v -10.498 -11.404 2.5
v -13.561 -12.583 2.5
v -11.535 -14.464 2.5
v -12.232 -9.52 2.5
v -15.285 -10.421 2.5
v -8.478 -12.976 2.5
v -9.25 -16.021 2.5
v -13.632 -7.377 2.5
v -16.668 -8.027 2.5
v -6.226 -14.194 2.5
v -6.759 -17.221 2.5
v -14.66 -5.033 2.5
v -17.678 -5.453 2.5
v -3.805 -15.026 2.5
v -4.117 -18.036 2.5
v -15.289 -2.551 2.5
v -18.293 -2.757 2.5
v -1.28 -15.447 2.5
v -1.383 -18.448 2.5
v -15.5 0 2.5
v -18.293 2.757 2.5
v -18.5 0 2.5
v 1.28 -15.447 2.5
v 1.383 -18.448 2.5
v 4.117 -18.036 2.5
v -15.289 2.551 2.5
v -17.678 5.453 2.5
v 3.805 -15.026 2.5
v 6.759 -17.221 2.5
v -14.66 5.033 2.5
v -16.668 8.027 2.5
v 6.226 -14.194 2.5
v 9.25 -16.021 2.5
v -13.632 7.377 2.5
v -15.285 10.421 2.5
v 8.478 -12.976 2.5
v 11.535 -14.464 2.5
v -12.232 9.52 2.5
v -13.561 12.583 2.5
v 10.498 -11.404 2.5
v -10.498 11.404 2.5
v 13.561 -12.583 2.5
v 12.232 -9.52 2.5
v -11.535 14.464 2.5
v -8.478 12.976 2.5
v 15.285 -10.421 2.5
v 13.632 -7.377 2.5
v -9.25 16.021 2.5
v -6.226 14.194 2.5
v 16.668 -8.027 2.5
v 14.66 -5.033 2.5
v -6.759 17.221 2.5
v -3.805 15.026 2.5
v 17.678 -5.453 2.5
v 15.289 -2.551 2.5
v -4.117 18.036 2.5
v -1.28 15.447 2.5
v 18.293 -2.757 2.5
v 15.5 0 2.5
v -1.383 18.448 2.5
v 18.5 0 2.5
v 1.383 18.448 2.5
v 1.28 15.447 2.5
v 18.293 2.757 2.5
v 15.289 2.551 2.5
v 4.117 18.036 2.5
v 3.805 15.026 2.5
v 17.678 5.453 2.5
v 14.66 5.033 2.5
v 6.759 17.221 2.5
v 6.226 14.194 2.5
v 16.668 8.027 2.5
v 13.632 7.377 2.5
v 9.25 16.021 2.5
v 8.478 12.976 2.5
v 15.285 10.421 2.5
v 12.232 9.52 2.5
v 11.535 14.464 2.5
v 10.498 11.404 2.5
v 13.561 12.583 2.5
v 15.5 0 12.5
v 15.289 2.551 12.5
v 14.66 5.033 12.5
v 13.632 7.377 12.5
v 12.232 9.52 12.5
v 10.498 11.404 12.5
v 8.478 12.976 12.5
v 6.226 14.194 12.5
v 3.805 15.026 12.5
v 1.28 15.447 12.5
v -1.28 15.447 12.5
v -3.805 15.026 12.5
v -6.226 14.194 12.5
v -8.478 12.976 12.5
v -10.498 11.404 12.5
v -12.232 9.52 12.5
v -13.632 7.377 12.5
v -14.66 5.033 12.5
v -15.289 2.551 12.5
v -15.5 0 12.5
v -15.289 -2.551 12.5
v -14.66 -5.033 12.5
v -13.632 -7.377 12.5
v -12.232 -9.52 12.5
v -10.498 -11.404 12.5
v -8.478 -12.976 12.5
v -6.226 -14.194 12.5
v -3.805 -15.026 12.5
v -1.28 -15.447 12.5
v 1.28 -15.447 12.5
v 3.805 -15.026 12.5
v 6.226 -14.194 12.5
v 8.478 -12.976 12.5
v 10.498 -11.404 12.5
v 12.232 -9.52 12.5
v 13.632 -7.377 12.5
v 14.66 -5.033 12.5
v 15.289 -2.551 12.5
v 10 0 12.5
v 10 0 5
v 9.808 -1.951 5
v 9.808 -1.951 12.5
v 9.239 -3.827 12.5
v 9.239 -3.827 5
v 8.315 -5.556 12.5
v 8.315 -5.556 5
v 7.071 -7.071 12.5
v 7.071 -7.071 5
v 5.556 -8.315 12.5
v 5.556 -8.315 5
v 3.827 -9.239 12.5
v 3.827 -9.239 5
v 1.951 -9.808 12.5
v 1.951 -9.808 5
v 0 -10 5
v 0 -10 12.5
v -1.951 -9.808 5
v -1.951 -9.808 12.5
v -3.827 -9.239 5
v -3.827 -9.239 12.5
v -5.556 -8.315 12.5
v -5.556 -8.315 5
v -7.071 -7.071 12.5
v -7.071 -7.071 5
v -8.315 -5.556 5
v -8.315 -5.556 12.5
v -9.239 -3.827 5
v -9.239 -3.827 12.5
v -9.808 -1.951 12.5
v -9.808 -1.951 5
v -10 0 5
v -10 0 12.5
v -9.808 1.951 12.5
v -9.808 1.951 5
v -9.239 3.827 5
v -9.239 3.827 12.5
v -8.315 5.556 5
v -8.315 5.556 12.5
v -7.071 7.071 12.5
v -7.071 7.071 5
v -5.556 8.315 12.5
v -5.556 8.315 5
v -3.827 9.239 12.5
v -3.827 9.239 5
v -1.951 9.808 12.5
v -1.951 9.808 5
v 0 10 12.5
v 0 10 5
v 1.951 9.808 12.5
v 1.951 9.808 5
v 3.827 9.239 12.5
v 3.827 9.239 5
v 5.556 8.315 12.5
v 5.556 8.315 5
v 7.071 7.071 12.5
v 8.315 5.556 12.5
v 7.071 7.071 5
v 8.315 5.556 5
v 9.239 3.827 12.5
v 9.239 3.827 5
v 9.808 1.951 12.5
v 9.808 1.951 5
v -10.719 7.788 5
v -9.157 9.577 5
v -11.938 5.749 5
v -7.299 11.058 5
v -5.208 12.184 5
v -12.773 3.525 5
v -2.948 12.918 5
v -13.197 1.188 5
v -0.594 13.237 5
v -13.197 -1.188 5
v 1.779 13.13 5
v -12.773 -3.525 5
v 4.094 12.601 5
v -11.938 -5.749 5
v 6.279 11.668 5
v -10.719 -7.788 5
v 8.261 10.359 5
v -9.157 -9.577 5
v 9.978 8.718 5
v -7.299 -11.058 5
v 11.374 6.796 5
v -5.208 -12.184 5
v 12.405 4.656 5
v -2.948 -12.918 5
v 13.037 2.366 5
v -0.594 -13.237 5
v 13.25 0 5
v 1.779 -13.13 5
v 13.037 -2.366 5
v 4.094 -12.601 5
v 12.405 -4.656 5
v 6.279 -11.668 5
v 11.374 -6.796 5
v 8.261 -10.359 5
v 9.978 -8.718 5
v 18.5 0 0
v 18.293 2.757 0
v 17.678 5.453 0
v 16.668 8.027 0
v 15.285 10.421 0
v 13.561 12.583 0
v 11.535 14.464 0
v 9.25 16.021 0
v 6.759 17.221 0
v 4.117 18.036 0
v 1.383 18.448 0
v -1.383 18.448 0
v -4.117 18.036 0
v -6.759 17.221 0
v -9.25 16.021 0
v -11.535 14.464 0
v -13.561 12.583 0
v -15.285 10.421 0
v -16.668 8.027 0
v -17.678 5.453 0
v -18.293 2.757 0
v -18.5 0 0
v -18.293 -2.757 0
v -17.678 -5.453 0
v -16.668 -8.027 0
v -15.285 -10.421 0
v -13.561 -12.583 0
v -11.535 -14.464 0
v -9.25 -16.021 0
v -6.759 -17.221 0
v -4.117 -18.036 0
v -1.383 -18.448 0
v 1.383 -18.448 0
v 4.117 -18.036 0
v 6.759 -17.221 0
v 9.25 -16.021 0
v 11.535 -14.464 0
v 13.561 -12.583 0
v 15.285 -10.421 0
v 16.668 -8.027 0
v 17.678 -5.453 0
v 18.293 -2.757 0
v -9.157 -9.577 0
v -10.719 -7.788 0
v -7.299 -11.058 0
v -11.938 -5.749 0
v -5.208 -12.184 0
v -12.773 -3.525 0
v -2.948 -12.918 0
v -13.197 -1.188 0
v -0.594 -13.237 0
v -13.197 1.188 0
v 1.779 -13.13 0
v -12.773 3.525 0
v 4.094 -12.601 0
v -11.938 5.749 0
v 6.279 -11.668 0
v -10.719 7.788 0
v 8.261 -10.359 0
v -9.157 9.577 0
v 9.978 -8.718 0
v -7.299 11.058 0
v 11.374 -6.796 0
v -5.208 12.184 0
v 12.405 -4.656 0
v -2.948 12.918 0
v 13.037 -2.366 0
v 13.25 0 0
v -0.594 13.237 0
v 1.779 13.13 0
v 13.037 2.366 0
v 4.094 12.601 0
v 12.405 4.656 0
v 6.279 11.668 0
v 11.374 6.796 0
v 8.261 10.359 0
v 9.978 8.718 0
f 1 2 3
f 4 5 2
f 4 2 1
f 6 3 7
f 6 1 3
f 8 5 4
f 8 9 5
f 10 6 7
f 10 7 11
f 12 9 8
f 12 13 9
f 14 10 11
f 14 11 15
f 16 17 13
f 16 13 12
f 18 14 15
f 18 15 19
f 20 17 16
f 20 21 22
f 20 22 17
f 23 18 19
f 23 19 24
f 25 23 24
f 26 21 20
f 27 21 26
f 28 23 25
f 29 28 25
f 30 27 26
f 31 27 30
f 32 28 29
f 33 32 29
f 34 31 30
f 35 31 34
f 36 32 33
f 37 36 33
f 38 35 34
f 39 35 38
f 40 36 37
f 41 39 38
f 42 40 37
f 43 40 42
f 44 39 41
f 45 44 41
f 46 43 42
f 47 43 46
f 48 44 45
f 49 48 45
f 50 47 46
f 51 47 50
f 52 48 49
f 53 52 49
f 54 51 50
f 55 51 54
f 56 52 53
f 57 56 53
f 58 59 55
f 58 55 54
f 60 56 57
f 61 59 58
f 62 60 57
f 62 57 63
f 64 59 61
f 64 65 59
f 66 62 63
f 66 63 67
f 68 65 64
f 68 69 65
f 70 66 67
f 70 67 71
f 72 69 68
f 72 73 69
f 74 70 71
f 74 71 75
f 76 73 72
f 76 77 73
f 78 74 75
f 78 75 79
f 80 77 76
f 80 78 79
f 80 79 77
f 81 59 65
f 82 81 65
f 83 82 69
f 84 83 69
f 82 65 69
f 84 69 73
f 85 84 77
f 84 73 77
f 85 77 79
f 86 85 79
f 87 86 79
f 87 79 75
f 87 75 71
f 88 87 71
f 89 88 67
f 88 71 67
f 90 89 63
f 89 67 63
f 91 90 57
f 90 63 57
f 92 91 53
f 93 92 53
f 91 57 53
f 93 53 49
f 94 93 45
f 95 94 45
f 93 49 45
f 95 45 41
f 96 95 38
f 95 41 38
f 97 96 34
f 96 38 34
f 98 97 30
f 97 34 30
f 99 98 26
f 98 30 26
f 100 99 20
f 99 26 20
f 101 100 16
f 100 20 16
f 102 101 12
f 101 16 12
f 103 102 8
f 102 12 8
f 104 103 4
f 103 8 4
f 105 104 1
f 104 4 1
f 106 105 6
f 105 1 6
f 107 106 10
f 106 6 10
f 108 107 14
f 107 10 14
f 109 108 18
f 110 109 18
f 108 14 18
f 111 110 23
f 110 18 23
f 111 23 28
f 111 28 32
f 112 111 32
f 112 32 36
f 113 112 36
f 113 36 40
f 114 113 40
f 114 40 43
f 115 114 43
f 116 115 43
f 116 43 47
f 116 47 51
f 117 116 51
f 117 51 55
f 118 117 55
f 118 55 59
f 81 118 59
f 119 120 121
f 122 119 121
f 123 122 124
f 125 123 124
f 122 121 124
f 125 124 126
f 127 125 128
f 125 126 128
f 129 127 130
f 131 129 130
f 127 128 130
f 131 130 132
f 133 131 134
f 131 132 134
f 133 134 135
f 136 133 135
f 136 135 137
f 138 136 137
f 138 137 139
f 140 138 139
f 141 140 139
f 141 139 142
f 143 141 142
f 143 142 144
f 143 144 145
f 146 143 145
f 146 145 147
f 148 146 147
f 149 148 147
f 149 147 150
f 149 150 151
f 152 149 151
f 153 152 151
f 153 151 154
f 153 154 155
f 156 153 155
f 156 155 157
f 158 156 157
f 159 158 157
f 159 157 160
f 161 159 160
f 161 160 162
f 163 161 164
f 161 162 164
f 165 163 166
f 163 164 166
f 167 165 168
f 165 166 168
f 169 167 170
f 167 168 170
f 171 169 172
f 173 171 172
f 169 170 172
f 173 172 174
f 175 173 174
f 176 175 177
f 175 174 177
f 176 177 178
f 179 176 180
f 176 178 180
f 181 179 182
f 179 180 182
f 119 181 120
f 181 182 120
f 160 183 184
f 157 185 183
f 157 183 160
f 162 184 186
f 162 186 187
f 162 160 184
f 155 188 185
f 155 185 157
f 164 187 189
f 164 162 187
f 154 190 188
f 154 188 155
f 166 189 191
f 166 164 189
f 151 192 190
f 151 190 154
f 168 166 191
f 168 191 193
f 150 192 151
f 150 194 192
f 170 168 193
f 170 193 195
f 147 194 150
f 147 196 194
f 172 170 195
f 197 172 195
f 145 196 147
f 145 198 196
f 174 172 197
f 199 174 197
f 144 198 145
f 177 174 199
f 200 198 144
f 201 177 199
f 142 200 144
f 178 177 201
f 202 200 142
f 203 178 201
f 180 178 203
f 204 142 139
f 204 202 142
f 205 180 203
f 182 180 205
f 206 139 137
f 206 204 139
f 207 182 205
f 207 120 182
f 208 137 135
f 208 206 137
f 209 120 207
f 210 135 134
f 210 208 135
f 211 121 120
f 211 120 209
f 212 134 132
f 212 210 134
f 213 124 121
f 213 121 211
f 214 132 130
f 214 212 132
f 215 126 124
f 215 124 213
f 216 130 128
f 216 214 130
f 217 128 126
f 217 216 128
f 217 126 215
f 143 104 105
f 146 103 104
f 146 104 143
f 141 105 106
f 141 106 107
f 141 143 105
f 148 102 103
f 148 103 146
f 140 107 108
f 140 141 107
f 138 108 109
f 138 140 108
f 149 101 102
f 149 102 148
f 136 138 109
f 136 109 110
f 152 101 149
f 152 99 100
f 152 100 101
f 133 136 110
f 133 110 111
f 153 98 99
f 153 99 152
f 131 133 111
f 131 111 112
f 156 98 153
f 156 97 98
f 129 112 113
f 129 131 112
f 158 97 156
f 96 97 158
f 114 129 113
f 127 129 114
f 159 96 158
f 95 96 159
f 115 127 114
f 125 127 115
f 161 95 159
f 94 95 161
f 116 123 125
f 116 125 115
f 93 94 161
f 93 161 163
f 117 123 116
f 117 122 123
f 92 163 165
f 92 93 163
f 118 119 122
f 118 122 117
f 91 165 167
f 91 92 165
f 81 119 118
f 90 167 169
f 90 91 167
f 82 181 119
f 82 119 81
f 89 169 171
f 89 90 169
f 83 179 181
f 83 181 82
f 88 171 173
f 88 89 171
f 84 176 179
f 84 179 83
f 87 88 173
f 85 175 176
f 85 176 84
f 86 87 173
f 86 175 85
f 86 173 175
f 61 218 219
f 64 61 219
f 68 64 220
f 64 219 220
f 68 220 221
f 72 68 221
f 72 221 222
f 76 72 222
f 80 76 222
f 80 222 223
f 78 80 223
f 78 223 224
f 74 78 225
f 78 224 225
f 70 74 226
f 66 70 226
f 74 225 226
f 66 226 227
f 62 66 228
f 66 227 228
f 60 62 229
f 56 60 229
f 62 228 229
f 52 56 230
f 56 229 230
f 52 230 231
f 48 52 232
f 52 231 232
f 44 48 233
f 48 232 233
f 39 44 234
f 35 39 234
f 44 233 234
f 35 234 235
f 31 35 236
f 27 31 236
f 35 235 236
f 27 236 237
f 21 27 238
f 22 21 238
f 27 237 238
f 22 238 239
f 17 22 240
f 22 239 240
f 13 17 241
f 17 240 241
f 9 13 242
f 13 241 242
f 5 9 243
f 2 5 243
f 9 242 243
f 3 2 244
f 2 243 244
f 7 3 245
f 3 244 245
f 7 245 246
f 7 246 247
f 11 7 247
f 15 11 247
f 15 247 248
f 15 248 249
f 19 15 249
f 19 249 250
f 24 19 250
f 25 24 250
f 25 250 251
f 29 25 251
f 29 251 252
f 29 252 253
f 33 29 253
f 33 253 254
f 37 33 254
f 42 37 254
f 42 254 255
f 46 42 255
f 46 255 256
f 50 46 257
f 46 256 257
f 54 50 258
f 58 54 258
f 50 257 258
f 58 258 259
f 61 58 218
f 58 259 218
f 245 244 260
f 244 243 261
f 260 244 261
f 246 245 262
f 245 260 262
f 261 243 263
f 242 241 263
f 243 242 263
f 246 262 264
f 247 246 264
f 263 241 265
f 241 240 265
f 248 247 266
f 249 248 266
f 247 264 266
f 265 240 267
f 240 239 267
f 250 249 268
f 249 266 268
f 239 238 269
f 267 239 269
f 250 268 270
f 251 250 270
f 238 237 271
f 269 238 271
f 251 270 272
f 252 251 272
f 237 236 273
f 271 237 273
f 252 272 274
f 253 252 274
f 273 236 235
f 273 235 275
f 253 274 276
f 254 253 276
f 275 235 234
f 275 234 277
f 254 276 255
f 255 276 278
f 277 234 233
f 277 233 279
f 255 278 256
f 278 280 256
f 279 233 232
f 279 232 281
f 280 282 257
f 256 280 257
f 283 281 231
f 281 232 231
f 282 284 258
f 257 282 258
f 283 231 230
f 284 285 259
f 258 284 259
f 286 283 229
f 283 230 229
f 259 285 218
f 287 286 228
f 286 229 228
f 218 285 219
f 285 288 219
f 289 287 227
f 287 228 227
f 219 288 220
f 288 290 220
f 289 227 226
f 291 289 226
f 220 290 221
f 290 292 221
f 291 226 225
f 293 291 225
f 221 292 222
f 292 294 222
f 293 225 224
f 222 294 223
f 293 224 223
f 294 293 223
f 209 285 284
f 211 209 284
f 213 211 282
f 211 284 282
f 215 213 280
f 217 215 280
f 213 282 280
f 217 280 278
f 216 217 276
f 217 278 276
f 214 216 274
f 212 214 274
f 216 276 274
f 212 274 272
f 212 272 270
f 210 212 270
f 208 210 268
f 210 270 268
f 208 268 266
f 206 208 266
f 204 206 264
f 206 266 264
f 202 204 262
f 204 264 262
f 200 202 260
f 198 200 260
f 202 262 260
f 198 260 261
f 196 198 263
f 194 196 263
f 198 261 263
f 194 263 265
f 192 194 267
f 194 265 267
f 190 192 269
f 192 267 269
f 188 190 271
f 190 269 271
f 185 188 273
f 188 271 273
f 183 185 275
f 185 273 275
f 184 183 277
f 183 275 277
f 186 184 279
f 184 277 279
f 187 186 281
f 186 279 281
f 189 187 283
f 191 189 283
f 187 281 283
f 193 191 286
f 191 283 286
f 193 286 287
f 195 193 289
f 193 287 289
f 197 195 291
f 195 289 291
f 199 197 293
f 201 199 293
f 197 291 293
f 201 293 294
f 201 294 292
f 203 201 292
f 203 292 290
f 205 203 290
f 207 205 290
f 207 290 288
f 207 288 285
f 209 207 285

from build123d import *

# Parameters (mm, degrees)
F0_R     = 18.5
F1_DEPTH = 2.5
F2_R     = 15.5
F3_DEPTH = 10
F4_R     = 13.25
F5_DEPTH = 5
F6_R     = 10
F7_DEPTH = 7.501


with BuildPart() as f1:
    # F0 (on Top) → F1 (new body)
    with BuildSketch(Plane.XY):
        Circle(F0_R)
    extrude(amount=F1_DEPTH)

    # F2 (on face) → F3 (join)
    with BuildSketch(Plane.XY.offset(2.5)):
        Circle(F2_R)
    extrude(amount=F3_DEPTH)

    # F4 (on face) → F5 (cut)
    with BuildSketch(Plane(origin=(0, 0, 0), x_dir=(1, 0, 0), z_dir=(0, 0, -1))):
        Circle(F4_R)
    extrude(amount=-F5_DEPTH, mode=Mode.SUBTRACT)

    # F6 (on face) → F7 (cut, through all)
    with BuildSketch(Plane(origin=(0, 0, 5), x_dir=(1, 0, 0), z_dir=(0, 0, -1))):
        Circle(F6_R)
    extrude(amount=-F7_DEPTH, mode=Mode.SUBTRACT)


solid = f1.part
